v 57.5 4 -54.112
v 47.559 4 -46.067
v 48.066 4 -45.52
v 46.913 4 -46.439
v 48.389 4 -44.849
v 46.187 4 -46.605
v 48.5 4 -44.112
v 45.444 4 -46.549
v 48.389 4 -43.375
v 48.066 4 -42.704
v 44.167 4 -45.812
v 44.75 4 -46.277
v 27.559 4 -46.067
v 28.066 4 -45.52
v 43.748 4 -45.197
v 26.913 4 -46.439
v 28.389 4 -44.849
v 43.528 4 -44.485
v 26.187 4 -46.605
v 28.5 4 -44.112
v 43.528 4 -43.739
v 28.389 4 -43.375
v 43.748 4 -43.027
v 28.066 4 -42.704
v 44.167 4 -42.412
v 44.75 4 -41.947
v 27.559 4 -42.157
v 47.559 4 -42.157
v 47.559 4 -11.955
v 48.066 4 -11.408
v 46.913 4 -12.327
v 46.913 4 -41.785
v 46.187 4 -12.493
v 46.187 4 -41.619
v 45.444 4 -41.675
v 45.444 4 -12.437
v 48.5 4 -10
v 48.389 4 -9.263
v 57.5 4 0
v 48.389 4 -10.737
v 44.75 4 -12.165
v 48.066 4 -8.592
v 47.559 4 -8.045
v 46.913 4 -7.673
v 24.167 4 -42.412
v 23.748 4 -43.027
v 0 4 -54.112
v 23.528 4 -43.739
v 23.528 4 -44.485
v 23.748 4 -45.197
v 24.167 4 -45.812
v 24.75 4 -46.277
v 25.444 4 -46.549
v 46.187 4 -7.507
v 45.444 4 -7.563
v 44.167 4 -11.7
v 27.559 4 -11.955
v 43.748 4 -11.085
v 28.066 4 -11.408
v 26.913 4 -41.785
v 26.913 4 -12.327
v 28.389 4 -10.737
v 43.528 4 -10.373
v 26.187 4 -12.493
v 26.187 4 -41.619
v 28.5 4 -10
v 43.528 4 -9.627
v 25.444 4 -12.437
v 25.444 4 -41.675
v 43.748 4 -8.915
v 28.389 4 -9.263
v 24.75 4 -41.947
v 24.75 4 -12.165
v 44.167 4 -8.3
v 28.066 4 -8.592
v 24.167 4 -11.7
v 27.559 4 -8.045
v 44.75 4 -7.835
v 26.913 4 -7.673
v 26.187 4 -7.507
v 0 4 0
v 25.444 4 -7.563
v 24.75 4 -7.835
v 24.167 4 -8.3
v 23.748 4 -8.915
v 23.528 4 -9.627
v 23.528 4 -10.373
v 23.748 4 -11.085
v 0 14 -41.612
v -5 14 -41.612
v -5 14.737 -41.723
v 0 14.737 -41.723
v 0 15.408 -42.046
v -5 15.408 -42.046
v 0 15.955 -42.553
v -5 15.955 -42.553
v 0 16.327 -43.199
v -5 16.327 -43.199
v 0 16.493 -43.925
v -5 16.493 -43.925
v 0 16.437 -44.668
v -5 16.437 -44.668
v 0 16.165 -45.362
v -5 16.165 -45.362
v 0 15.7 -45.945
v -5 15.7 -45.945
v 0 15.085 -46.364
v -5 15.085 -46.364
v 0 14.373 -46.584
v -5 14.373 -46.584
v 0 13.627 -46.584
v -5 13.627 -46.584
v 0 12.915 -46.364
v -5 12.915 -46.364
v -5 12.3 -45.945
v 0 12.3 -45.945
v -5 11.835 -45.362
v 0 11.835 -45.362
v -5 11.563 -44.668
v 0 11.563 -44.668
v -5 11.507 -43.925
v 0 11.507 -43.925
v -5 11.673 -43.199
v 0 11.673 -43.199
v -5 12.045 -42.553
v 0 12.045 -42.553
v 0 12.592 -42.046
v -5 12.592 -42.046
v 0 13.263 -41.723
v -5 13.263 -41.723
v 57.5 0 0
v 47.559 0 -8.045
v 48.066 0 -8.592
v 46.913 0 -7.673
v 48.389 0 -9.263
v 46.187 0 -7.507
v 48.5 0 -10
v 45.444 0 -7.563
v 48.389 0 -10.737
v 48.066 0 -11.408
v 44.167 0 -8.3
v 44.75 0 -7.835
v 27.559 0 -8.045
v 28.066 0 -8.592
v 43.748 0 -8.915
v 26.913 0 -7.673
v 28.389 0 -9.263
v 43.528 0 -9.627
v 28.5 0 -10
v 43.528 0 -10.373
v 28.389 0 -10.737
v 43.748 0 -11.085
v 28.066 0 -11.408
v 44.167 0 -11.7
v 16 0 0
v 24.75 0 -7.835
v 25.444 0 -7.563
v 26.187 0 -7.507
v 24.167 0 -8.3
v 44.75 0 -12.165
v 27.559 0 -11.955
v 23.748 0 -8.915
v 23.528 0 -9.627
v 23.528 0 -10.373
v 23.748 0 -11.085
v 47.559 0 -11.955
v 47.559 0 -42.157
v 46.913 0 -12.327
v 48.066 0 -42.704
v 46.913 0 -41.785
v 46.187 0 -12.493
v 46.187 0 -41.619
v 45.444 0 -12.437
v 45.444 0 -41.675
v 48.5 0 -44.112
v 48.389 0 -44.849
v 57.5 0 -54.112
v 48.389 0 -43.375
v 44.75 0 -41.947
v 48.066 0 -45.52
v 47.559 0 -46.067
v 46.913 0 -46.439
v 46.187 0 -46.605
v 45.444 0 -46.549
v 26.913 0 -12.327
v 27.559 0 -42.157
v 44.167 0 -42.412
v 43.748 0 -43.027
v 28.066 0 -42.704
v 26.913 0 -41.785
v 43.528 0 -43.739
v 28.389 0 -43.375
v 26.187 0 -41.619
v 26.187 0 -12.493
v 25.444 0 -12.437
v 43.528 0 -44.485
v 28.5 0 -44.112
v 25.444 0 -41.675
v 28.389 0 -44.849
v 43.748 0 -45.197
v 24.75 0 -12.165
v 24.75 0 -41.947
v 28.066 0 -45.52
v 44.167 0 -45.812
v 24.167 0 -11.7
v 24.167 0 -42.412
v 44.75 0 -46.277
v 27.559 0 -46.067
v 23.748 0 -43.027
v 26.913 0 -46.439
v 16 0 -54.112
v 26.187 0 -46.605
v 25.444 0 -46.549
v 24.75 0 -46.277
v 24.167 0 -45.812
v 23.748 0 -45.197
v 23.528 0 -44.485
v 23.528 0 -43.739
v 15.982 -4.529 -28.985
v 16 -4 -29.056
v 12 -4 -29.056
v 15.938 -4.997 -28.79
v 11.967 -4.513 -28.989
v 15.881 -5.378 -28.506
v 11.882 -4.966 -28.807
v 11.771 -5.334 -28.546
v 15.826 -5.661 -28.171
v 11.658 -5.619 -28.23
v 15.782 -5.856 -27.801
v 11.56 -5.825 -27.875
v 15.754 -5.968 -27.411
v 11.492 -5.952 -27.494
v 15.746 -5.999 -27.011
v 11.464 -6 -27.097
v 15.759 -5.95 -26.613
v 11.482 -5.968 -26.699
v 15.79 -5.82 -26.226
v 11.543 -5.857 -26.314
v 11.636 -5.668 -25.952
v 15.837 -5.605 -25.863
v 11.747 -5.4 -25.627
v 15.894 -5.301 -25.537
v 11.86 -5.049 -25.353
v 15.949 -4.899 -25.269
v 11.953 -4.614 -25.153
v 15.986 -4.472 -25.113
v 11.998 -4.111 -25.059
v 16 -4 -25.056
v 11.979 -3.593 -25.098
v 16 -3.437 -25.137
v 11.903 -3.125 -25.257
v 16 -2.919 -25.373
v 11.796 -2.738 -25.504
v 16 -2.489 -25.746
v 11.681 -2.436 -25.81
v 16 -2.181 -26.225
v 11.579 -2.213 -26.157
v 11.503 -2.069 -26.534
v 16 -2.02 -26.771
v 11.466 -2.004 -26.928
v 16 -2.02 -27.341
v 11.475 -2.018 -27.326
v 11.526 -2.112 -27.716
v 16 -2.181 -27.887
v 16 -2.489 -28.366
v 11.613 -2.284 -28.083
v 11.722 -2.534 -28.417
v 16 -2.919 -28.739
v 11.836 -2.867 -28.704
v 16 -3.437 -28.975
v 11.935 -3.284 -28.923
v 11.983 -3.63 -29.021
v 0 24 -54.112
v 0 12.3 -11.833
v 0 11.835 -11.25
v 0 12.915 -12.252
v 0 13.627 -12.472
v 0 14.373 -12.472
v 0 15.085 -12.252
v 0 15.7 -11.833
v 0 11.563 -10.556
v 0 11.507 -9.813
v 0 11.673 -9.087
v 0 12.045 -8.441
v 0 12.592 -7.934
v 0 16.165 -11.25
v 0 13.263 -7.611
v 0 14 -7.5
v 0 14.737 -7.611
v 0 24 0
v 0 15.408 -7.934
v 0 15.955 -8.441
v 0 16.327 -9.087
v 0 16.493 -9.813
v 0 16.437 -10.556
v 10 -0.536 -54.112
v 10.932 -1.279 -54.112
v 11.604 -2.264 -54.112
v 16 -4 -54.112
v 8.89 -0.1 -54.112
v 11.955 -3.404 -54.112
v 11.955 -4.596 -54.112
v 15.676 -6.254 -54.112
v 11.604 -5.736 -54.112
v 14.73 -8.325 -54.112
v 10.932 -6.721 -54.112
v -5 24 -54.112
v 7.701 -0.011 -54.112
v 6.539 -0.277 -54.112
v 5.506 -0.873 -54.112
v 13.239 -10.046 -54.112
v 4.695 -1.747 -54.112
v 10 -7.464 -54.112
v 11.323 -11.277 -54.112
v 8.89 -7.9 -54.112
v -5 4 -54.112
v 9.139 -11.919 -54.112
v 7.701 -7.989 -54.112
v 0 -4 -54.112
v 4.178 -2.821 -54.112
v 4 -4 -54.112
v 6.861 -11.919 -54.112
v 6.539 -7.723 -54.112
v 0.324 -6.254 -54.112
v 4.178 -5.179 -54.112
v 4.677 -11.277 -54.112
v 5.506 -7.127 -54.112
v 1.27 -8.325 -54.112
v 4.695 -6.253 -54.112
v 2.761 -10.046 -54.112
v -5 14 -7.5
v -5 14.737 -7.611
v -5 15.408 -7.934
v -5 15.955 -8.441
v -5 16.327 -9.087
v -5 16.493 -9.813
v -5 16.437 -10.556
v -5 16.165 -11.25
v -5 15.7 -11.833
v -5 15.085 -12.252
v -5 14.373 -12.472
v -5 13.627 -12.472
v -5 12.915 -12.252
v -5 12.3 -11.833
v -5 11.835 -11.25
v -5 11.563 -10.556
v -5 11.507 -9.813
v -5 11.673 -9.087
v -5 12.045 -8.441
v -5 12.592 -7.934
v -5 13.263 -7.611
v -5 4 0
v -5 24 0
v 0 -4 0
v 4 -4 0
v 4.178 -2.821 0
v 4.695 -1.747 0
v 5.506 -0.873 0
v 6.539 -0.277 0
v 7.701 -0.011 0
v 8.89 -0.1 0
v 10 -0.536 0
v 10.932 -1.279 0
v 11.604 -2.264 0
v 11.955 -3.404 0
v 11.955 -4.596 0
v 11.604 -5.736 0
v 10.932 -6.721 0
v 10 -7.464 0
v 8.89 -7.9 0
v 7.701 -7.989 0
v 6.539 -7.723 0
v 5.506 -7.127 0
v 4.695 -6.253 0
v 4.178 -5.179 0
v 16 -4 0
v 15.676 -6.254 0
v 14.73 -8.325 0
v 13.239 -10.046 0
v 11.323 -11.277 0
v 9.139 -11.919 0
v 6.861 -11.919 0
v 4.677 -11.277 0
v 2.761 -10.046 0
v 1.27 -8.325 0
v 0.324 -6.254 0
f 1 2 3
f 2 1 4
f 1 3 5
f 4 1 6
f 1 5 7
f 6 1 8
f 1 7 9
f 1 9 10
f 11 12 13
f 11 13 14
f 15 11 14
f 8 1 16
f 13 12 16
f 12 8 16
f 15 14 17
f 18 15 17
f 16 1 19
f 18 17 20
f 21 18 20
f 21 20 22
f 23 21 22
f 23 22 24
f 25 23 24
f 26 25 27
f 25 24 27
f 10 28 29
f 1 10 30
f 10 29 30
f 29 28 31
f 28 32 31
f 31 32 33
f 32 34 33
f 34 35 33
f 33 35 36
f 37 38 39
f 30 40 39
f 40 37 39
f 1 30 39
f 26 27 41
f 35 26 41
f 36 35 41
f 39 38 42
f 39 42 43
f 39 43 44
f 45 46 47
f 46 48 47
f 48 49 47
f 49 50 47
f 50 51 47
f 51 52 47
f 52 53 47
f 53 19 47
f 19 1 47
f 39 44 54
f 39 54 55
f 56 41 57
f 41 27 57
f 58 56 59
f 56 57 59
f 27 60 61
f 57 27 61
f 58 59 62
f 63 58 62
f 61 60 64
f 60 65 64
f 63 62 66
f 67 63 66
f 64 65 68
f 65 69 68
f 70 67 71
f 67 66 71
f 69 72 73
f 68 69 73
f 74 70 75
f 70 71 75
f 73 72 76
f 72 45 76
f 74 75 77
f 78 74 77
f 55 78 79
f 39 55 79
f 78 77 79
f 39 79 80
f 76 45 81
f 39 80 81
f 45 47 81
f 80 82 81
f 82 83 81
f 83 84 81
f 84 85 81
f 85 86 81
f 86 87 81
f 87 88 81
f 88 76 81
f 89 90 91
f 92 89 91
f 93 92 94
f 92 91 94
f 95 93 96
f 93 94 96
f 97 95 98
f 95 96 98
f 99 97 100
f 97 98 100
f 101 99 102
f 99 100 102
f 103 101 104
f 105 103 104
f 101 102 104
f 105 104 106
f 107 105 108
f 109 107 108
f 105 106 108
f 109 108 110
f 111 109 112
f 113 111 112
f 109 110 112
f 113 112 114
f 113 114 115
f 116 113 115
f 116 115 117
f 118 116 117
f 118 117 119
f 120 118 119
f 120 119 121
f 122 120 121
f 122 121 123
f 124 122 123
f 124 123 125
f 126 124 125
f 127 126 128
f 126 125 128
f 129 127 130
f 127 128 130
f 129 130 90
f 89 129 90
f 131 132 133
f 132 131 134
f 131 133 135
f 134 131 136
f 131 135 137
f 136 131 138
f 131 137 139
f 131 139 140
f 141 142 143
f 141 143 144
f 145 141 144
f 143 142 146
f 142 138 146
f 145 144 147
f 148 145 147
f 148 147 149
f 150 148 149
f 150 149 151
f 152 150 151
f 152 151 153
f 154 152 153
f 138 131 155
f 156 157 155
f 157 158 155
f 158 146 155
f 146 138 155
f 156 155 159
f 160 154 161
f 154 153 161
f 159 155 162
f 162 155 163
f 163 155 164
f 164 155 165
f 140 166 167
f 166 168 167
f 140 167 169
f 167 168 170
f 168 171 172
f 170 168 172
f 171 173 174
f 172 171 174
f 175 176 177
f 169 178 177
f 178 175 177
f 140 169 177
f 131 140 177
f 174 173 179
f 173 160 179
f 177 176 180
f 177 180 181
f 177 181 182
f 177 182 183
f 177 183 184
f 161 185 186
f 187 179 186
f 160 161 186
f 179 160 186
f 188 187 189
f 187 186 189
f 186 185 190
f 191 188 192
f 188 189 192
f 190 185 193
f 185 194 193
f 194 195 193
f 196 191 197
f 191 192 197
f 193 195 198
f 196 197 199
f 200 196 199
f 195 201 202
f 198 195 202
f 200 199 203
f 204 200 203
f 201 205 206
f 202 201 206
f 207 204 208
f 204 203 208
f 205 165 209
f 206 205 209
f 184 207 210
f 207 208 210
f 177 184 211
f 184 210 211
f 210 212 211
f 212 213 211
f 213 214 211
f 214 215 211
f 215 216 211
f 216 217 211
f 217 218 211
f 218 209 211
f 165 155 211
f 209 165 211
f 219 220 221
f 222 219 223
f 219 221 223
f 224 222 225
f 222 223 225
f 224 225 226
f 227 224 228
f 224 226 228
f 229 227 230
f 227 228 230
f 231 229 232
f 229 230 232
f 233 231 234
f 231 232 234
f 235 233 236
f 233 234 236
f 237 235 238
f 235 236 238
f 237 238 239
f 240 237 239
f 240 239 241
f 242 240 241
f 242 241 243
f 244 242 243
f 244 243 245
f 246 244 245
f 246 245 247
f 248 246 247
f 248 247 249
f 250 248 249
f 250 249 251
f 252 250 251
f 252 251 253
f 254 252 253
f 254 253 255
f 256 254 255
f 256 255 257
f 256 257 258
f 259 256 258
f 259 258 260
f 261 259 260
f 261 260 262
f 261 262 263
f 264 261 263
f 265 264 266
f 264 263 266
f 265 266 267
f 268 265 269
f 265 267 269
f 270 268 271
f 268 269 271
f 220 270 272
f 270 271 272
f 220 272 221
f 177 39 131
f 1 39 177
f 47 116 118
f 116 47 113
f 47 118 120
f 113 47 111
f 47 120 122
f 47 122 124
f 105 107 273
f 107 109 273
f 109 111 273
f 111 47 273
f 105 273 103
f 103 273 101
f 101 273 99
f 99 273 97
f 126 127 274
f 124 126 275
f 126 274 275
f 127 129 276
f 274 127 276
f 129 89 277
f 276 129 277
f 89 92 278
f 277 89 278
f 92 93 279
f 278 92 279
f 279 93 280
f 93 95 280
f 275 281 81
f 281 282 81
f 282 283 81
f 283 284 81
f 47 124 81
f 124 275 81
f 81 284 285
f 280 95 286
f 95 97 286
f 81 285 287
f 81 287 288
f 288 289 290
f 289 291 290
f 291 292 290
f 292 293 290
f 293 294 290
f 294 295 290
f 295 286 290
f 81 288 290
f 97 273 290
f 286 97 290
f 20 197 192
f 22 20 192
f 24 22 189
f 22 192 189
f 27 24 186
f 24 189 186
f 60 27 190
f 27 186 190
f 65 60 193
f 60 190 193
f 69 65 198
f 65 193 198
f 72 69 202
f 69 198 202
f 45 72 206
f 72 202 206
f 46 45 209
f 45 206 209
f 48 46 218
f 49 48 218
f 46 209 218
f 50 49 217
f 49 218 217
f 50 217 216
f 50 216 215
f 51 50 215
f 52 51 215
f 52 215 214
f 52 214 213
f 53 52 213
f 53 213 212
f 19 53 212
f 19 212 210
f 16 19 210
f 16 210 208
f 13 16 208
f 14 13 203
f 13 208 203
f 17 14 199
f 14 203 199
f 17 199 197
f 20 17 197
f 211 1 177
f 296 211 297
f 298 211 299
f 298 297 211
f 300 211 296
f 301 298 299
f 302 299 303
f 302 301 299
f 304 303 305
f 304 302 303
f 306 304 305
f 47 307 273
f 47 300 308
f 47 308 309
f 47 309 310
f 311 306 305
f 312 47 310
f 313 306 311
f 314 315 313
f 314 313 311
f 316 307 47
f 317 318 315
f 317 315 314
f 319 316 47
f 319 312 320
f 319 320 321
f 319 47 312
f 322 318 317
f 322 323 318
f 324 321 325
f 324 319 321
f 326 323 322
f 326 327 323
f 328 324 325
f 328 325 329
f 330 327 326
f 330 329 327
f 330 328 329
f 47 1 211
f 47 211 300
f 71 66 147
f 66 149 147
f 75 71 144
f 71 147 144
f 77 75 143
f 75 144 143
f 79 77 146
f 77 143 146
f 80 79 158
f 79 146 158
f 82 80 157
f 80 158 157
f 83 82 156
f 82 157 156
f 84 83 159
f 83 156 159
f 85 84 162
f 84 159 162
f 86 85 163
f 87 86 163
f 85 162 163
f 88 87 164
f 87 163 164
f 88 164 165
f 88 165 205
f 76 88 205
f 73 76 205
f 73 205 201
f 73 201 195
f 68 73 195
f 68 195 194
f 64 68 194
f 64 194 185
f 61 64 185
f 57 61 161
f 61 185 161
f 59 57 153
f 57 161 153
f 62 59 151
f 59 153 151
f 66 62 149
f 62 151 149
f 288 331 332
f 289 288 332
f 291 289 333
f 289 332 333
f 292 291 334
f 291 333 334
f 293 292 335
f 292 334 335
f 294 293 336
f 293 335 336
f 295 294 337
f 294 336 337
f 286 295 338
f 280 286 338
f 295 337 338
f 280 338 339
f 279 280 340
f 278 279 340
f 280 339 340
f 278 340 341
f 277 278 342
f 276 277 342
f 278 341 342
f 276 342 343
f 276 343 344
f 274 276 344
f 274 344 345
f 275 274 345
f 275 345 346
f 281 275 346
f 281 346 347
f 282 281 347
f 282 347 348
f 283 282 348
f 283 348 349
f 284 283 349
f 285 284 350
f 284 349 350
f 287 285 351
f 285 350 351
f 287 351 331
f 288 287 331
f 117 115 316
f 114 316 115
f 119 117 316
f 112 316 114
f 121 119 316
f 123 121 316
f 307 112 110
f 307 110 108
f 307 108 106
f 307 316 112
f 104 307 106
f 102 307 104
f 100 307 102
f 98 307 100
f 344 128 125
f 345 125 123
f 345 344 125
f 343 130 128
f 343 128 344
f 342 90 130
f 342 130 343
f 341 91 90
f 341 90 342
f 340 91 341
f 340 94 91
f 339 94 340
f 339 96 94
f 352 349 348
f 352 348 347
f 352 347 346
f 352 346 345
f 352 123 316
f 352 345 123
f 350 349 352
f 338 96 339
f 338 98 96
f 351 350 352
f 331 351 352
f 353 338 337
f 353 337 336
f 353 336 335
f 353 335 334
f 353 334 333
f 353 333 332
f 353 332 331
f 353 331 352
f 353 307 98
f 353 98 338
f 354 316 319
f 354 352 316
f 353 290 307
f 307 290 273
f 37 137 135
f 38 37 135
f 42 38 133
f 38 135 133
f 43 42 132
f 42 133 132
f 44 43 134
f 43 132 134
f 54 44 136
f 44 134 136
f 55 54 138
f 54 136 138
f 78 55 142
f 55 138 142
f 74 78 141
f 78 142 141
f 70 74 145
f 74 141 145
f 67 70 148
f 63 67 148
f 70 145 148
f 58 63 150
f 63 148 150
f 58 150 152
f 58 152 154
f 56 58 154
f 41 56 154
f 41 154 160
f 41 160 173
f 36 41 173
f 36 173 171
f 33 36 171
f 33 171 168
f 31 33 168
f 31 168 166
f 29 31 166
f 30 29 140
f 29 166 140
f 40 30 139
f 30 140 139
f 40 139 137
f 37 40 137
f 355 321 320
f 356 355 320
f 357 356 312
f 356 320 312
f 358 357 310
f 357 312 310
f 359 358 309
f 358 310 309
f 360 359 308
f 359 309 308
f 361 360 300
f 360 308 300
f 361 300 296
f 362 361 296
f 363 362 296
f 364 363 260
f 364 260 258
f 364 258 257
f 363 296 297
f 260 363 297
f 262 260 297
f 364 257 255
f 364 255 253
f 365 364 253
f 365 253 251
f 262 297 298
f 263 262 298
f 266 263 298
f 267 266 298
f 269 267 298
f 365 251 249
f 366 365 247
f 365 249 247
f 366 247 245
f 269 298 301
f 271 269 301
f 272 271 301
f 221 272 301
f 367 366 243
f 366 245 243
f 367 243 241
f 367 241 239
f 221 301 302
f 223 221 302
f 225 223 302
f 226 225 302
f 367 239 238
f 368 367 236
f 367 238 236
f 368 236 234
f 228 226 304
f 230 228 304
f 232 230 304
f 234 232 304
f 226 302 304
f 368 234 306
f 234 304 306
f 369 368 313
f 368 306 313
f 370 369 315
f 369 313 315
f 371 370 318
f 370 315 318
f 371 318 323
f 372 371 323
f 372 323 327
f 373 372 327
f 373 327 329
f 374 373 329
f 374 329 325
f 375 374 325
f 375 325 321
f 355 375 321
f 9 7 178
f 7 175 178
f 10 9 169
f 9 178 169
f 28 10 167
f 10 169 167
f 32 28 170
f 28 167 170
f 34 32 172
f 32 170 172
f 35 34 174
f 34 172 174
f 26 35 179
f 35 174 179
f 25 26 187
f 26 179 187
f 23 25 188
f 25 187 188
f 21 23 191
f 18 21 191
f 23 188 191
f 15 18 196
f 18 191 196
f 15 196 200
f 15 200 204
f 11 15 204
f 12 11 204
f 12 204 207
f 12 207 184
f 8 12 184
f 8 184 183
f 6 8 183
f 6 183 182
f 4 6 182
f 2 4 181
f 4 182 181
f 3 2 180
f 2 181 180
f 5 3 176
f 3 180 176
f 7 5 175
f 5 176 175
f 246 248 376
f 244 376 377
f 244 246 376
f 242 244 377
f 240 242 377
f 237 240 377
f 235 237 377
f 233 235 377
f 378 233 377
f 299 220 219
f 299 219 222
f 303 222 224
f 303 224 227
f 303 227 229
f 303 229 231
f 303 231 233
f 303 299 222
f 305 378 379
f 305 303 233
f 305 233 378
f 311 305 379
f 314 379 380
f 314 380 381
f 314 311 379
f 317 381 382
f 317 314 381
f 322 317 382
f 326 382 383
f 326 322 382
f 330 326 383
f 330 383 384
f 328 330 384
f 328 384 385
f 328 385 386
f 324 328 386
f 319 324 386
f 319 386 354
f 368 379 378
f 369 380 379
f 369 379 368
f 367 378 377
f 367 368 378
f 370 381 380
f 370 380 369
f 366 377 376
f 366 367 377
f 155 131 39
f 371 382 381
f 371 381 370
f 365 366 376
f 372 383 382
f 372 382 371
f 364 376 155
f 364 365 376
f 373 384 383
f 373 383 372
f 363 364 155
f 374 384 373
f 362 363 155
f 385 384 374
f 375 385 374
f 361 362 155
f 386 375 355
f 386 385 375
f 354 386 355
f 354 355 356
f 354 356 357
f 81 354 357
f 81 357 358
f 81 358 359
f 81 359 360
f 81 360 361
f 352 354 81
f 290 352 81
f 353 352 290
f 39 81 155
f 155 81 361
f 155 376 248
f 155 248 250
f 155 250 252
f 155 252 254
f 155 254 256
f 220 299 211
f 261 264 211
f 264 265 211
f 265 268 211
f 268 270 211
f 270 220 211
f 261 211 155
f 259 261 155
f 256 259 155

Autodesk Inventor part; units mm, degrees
ref_plane "YZ Plane" through (0, 0, 0) normal (1, 0, 0) x (0, 1, 0)
ref_plane "XZ Plane" through (0, 0, 0) normal (0, 1, 0) x (-1, 0, 0)
ref_plane "XY Plane" through (0, 0, 0) normal (0, 0, 1) x (1, 0, 0)
sketch "Sketch1" plane through (0, 0, 0) normal (0, 1, 0) x (-1, 0, 0)
  line L0 (0, 0) -> (-50, 0)
  line L1 (-50, 0) -> (-50, -54.112)
  line L2 (-50, -54.112) -> (0, -54.112)
  line L3 (0, -54.112) -> (0, 0)
  dimension "d0" = 50
  dimension "d1" = 54.112
extrude "Extrusion1" add sketch "Sketch1" along normal blind 4
sketch "Sketch2" plane through (50, 0, -54.112) normal (0, 0, -1) x (-1, 0, 0)
  line L0 (50, 0) -> (42, 0)
  line L1 (0, 0) -> (50, 0) projected
  line L2 (42, 0) -> (42, -4)
  circle A0 centre (42, -4) radius 4
  circle A1 centre (42, -4) radius 8
  line L3 (50, -4) -> (50, 0)
  line L4 (34, -4) -> (34, 0)
  line L5 (34, 0) -> (35.0718, 0)
  line L6 (50, 0) -> (48.9282, 0)
  dimension "d4" = 8
  dimension "d6" = 4
  dimension "d7" = 16
extrude "Extrusion2" add sketch "Sketch2" against normal blind 54.112 contours L3 A1 L0 | A1 L1 L0 | A1 L4 L1 picked at (48.5892, -4.6382)
sketch "Sketch4" plane through (0, 0, 0) normal (0, -1, 0) x (1, 0, 0)
  line L0 (50, -54.112) -> (16, -54.112) projected
  line L1 (16, -54.112) -> (26, -54.112)
  line L2 (26, -54.112) -> (26, -44.112)
  line L3 (0, 0) -> (50, 0) projected
  line L4 (26, 0) -> (16, 0)
  line L5 (26, 0) -> (26, -10)
  line L6 (26, -10) -> (46, -10)
  line L7 (26, -44.112) -> (46, -44.112)
  circle A0 centre (46, -44.112) radius 2.5
  circle A1 centre (46, -10) radius 2.5
  circle A2 centre (26, -10) radius 2.5
  circle A3 centre (26, -44.112) radius 2.5
  dimension "d10" = 10
  dimension "d11" = 10
  dimension "d12" = 10
  dimension "d13" = 10
  dimension "d14" = 20
  dimension "d15" = 20
  dimension "d16" = 5
  dimension "d17" = 5
  dimension "d18" = 5
  dimension "d19" = 5
extrude "Extrusion3" cut sketch "Sketch4" against normal blind 54.112
sketch "Sketch5" plane through (0, 4, -54.112) normal (-1, 0, 0) x (0, 0, 1)
  line L0 (0, 0) -> (54.112, 0) projected
  line L1 (0, 0) -> (54.112, 0)
  line L2 (54.112, 0) -> (54.112, 20)
  line L3 (54.112, 20) -> (0, 20)
  line L4 (0, 20) -> (0, 0)
  point P0 (54.112, -4)
  dimension "d22" = 20
extrude "Extrusion4" add sketch "Sketch5" along normal blind 5
sketch "Sketch6" plane through (50, 0, 0) normal (0, 0, 1) x (1, 0, 0)
  line L0 (-50, 4) -> (-55, 4) projected
  line L1 (-50, -4) -> (-50, 4) projected
  line L2 (-55, 4) -> (-50, -4)
  line L3 (-50, -4) -> (-50, 4)
  line L4 (-50, 4) -> (-55, 4)
  point P0 (-50, 0)
extrude "Extrusion5" add sketch "Sketch6" against normal up to surface (54.112 mm away)
sketch "Sketch7" plane through (-5, 4, -54.112) normal (-1, 0, 0) x (0, 0, 1)
  line L0 (0, 0) -> (27.056, 0)
  line L1 (0, 20) -> (0, 0) projected
  line L2 (0, 0) -> (10, 0)
  line L3 (10, 0) -> (10, 10)
  line L4 (0, 0) -> (54.112, 0) projected
  line L5 (54.112, 0) -> (44.112, 0)
  line L6 (44.112, 0) -> (44.112, 10)
  circle A0 centre (10, 10) radius 2.5
  circle A1 centre (44.112, 10) radius 2.5
  point P0 (54.112, -4)
  dimension "d45" = 10
  dimension "d46" = 10
  dimension "d47" = 10
  dimension "d48" = 5
  dimension "d49" = 5
extrude "Extrusion6" cut sketch "Sketch7" against normal blind 10
sketch "Sketch8" plane through (50, 0, 0) normal (1, 0, 0) x (0, 0, -1)
  line L0 (54.112, 4) -> (0, 4) projected
  line L1 (0, 0) -> (54.112, 0) projected
  line L2 (0, 4) -> (54.112, 4)
  line L3 (54.112, 4) -> (54.112, 0)
  line L4 (54.112, 0) -> (0, 0)
  line L5 (0, 0) -> (0, 4)
extrude "Extrusion7" add sketch "Sketch8" along normal blind 7.5
sketch "Sketch9" plane through (16, -4, -54.112) normal (1, 0, 0) x (0, 0, -1)
  line L0 (0, 0) -> (-54.112, 0) projected
  line L1 (-54.112, 0) -> (-27.056, 0)
  circle A0 centre (-27.056, 0) radius 2
  point P0 (-54.112, 4)
  dimension "d33" = 4
hole "Hole1" at (16, -4, -27.056) direction (-1, 0, 0) diameter 4 end up to surface
thread "Thread2" size "M4x0.7" class "6H" standard "ANSI Metric M Profile" length 15
properties part number "4x2020_subaxis" material "PET Plastic"
